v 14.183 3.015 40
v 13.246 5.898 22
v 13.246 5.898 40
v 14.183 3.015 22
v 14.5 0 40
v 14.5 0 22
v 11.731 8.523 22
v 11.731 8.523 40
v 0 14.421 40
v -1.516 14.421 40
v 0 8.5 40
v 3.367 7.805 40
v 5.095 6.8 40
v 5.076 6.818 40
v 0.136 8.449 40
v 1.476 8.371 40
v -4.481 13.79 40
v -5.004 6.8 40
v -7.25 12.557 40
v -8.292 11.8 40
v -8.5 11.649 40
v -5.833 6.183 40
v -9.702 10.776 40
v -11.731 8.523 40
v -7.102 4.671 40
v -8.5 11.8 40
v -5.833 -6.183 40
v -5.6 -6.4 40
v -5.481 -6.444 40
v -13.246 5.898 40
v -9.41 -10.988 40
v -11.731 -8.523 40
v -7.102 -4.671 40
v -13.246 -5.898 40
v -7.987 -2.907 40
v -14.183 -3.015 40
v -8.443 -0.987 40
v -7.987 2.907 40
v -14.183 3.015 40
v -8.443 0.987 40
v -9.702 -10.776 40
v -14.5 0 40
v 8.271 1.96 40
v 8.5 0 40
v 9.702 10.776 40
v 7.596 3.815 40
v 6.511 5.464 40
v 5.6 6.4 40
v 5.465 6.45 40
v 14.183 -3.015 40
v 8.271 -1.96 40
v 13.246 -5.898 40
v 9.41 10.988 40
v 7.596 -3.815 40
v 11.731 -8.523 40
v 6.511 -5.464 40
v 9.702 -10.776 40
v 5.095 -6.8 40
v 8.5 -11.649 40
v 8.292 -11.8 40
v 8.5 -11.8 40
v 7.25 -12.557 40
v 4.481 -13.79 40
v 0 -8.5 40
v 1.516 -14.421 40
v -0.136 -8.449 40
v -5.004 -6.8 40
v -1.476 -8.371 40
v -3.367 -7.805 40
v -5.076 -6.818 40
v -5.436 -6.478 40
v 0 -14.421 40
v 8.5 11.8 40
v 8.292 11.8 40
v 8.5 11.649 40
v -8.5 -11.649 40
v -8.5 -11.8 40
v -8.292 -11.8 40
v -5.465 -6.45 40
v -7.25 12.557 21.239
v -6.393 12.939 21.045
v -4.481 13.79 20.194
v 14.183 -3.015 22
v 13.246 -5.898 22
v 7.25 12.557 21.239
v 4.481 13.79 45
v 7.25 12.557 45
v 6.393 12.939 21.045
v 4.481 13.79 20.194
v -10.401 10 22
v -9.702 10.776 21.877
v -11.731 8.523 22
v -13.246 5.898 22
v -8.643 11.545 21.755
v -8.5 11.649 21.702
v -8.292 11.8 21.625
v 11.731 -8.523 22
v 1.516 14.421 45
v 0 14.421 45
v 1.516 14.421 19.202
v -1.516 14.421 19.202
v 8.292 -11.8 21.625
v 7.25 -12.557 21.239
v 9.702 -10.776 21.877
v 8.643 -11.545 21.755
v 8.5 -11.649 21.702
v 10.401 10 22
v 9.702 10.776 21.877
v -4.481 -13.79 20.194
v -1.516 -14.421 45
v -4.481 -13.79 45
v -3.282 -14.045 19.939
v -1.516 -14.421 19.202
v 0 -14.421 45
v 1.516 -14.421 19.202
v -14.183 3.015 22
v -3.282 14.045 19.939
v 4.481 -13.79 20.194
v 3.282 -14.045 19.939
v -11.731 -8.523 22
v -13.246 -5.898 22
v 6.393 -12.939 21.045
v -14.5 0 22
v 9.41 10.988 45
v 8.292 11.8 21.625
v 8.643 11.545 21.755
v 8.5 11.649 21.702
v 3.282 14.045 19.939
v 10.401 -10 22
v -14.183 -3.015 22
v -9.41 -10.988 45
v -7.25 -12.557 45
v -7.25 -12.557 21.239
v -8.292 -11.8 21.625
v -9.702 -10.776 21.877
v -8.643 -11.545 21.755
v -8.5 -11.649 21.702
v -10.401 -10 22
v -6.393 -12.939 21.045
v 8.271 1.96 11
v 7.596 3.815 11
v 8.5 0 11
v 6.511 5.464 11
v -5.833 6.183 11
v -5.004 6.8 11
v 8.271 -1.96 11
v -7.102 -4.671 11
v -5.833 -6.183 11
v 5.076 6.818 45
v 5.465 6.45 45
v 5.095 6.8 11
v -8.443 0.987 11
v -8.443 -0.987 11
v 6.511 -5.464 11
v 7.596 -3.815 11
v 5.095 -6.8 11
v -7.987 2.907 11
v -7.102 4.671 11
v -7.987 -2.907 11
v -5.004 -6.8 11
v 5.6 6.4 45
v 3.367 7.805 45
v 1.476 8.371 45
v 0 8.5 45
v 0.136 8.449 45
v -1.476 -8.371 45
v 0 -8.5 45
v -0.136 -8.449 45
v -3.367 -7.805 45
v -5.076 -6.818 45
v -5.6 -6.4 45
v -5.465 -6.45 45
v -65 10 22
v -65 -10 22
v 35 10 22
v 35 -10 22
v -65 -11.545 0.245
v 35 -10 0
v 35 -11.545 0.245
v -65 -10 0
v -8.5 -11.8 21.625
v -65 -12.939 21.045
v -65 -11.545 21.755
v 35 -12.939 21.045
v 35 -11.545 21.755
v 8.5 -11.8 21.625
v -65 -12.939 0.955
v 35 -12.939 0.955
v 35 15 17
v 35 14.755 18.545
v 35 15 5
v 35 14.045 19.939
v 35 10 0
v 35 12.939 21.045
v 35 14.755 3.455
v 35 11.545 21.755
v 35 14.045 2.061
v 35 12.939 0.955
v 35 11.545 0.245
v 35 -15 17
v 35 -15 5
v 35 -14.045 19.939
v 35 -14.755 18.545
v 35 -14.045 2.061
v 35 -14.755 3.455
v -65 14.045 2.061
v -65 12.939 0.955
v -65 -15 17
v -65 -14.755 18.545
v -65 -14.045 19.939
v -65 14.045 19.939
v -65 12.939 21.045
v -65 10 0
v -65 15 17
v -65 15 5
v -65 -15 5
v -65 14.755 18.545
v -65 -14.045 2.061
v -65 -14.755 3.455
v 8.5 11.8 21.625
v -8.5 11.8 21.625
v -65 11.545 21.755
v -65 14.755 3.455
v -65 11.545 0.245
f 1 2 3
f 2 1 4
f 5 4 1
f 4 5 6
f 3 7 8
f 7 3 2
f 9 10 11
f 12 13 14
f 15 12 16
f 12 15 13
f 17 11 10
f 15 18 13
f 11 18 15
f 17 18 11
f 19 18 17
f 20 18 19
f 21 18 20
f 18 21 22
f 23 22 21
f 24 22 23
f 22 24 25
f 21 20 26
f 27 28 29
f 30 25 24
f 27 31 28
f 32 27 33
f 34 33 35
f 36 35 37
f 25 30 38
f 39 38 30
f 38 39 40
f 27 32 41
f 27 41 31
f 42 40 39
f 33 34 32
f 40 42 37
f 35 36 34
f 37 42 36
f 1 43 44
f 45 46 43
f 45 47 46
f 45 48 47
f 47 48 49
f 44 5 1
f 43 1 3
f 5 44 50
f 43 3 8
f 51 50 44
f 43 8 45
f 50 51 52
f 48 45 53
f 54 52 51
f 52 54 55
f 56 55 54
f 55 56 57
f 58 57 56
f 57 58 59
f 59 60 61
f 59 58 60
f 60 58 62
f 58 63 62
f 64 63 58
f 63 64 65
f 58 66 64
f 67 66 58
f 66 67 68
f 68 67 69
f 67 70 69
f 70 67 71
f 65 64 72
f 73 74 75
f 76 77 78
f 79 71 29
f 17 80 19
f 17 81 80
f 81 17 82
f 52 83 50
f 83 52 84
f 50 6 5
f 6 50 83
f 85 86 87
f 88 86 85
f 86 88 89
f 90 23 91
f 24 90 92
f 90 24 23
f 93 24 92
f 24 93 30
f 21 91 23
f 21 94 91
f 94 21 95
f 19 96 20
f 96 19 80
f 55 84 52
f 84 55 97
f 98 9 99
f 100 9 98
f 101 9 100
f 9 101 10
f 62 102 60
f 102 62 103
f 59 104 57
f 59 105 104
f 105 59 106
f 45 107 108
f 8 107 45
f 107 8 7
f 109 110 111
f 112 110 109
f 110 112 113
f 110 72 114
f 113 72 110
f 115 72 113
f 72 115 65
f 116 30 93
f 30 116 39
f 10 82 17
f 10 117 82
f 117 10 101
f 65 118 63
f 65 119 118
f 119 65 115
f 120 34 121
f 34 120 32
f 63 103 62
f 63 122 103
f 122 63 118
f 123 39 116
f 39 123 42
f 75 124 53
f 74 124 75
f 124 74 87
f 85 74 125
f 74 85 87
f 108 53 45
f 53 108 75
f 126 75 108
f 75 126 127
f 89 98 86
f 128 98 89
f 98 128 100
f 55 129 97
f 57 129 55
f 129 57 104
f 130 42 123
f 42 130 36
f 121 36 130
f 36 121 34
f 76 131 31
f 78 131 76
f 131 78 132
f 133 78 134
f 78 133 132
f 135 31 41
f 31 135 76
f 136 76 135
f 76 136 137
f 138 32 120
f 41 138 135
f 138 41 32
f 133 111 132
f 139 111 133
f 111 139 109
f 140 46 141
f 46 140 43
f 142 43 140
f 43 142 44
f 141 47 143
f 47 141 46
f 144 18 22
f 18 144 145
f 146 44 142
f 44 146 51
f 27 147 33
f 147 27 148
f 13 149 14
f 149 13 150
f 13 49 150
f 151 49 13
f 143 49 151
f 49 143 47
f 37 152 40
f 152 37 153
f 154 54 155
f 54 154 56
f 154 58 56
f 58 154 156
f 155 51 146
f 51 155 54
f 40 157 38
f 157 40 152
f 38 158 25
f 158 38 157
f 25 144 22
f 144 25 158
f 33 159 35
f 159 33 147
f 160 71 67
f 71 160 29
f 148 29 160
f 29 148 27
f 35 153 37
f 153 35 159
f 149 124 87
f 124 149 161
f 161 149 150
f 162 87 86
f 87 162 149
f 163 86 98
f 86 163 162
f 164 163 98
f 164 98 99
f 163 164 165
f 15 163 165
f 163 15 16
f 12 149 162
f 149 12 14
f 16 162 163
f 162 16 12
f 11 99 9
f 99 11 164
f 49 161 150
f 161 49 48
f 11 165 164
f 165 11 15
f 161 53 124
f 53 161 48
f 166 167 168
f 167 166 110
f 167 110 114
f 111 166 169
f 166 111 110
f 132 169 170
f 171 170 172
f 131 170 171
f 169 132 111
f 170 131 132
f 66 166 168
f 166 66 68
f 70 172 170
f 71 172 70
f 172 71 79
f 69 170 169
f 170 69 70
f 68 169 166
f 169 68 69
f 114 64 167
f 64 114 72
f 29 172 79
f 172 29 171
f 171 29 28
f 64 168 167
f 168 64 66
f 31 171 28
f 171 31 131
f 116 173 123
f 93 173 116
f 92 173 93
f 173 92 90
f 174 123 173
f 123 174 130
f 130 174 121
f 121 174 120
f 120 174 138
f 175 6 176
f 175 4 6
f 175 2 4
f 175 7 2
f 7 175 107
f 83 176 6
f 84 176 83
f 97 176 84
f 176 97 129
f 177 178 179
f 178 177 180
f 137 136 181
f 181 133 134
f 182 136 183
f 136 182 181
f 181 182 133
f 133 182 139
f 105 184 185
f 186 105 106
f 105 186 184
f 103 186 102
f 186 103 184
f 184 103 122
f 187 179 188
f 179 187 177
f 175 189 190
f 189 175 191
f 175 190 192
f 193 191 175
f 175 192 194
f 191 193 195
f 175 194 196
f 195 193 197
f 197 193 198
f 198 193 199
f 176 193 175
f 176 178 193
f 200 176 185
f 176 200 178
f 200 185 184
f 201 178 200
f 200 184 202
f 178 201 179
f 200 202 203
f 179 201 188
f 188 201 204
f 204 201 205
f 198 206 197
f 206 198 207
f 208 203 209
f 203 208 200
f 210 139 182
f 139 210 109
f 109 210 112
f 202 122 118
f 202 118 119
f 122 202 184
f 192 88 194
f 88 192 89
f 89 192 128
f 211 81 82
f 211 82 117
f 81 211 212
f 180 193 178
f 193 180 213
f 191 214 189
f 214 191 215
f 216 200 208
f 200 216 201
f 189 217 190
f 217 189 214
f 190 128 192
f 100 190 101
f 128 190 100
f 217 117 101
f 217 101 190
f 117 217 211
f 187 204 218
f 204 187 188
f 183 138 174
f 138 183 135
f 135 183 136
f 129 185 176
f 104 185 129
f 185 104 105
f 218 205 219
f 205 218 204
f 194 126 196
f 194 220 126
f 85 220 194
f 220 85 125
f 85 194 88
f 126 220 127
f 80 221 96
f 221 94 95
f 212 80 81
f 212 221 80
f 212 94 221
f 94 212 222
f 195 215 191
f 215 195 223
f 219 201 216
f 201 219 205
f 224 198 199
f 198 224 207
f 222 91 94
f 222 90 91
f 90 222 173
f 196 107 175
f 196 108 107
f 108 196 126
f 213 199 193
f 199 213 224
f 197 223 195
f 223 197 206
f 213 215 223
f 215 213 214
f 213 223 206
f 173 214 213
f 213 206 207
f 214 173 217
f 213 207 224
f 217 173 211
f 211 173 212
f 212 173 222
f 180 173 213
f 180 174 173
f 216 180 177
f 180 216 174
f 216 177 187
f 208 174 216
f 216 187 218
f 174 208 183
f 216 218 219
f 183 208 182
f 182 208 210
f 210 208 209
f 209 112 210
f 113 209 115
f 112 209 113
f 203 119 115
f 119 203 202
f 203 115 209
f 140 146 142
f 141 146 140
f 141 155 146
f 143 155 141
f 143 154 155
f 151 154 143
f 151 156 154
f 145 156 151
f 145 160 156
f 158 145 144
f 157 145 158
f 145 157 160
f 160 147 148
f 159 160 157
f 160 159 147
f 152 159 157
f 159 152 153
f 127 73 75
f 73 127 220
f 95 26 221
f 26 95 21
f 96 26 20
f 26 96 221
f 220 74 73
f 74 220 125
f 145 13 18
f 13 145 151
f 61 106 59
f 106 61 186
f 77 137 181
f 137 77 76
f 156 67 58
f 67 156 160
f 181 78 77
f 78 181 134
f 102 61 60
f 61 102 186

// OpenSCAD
translate([0,0,11]){

//cylinders
difference () {
    cylinder(29,d=29, true);
    cylinder(30,d=17, true);
    }
translate([0,9.3,29/2])
    cube([17,5,29], true);
translate([0,-9.3,29/2])
    cube([17,5,29], true);
rotate(180, [0,0,1])  ergot1() ;
ergot1();
 difference(){
    translate([-65,0,0]) rotate(90,[0,1,0]) hull() roundedRect([17, 25, 100], 5, $fn=20);
    cylinder(30,d=17, true);
}
}
module ergot1(){
    intersection(){
    translate([0,0,29]) {
        difference () {
            cylinder(5,d=29, true);
            cylinder(6,d=17, true);
            }
        }
    hull()polyhedron( points = [ 
    [0,8.5,29],[0,16,29],[12.79,15.06,29],[5.6,6.4,29],
    [0,8.5,34],[0,16,34],[12.79,15.06,34],[5.6,6.4,34] ], faces = [
    [0,4,7,3],[1,5,6,2],[3,7,6,2],[0,1,5,4] ] );
}
}

// size - [x,y,z]
// radius - radius of corners
module roundedRect(size, radius)
{
	x = size[0];
	y = size[1];
	z = size[2];

	linear_extrude(height=z)
	hull()
	{
		// place 4 circles in the corners, with the given radius
		translate([(-x/2)+(radius/2), (-y/2)+(radius/2), 0])
		circle(r=radius);
	
		translate([(x/2)-(radius/2), (-y/2)+(radius/2), 0])
		circle(r=radius);
	
		translate([(-x/2)+(radius/2), (y/2)-(radius/2), 0])
		circle(r=radius);
	
		translate([(x/2)-(radius/2), (y/2)-(radius/2), 0])
		circle(r=radius);
	}
}
